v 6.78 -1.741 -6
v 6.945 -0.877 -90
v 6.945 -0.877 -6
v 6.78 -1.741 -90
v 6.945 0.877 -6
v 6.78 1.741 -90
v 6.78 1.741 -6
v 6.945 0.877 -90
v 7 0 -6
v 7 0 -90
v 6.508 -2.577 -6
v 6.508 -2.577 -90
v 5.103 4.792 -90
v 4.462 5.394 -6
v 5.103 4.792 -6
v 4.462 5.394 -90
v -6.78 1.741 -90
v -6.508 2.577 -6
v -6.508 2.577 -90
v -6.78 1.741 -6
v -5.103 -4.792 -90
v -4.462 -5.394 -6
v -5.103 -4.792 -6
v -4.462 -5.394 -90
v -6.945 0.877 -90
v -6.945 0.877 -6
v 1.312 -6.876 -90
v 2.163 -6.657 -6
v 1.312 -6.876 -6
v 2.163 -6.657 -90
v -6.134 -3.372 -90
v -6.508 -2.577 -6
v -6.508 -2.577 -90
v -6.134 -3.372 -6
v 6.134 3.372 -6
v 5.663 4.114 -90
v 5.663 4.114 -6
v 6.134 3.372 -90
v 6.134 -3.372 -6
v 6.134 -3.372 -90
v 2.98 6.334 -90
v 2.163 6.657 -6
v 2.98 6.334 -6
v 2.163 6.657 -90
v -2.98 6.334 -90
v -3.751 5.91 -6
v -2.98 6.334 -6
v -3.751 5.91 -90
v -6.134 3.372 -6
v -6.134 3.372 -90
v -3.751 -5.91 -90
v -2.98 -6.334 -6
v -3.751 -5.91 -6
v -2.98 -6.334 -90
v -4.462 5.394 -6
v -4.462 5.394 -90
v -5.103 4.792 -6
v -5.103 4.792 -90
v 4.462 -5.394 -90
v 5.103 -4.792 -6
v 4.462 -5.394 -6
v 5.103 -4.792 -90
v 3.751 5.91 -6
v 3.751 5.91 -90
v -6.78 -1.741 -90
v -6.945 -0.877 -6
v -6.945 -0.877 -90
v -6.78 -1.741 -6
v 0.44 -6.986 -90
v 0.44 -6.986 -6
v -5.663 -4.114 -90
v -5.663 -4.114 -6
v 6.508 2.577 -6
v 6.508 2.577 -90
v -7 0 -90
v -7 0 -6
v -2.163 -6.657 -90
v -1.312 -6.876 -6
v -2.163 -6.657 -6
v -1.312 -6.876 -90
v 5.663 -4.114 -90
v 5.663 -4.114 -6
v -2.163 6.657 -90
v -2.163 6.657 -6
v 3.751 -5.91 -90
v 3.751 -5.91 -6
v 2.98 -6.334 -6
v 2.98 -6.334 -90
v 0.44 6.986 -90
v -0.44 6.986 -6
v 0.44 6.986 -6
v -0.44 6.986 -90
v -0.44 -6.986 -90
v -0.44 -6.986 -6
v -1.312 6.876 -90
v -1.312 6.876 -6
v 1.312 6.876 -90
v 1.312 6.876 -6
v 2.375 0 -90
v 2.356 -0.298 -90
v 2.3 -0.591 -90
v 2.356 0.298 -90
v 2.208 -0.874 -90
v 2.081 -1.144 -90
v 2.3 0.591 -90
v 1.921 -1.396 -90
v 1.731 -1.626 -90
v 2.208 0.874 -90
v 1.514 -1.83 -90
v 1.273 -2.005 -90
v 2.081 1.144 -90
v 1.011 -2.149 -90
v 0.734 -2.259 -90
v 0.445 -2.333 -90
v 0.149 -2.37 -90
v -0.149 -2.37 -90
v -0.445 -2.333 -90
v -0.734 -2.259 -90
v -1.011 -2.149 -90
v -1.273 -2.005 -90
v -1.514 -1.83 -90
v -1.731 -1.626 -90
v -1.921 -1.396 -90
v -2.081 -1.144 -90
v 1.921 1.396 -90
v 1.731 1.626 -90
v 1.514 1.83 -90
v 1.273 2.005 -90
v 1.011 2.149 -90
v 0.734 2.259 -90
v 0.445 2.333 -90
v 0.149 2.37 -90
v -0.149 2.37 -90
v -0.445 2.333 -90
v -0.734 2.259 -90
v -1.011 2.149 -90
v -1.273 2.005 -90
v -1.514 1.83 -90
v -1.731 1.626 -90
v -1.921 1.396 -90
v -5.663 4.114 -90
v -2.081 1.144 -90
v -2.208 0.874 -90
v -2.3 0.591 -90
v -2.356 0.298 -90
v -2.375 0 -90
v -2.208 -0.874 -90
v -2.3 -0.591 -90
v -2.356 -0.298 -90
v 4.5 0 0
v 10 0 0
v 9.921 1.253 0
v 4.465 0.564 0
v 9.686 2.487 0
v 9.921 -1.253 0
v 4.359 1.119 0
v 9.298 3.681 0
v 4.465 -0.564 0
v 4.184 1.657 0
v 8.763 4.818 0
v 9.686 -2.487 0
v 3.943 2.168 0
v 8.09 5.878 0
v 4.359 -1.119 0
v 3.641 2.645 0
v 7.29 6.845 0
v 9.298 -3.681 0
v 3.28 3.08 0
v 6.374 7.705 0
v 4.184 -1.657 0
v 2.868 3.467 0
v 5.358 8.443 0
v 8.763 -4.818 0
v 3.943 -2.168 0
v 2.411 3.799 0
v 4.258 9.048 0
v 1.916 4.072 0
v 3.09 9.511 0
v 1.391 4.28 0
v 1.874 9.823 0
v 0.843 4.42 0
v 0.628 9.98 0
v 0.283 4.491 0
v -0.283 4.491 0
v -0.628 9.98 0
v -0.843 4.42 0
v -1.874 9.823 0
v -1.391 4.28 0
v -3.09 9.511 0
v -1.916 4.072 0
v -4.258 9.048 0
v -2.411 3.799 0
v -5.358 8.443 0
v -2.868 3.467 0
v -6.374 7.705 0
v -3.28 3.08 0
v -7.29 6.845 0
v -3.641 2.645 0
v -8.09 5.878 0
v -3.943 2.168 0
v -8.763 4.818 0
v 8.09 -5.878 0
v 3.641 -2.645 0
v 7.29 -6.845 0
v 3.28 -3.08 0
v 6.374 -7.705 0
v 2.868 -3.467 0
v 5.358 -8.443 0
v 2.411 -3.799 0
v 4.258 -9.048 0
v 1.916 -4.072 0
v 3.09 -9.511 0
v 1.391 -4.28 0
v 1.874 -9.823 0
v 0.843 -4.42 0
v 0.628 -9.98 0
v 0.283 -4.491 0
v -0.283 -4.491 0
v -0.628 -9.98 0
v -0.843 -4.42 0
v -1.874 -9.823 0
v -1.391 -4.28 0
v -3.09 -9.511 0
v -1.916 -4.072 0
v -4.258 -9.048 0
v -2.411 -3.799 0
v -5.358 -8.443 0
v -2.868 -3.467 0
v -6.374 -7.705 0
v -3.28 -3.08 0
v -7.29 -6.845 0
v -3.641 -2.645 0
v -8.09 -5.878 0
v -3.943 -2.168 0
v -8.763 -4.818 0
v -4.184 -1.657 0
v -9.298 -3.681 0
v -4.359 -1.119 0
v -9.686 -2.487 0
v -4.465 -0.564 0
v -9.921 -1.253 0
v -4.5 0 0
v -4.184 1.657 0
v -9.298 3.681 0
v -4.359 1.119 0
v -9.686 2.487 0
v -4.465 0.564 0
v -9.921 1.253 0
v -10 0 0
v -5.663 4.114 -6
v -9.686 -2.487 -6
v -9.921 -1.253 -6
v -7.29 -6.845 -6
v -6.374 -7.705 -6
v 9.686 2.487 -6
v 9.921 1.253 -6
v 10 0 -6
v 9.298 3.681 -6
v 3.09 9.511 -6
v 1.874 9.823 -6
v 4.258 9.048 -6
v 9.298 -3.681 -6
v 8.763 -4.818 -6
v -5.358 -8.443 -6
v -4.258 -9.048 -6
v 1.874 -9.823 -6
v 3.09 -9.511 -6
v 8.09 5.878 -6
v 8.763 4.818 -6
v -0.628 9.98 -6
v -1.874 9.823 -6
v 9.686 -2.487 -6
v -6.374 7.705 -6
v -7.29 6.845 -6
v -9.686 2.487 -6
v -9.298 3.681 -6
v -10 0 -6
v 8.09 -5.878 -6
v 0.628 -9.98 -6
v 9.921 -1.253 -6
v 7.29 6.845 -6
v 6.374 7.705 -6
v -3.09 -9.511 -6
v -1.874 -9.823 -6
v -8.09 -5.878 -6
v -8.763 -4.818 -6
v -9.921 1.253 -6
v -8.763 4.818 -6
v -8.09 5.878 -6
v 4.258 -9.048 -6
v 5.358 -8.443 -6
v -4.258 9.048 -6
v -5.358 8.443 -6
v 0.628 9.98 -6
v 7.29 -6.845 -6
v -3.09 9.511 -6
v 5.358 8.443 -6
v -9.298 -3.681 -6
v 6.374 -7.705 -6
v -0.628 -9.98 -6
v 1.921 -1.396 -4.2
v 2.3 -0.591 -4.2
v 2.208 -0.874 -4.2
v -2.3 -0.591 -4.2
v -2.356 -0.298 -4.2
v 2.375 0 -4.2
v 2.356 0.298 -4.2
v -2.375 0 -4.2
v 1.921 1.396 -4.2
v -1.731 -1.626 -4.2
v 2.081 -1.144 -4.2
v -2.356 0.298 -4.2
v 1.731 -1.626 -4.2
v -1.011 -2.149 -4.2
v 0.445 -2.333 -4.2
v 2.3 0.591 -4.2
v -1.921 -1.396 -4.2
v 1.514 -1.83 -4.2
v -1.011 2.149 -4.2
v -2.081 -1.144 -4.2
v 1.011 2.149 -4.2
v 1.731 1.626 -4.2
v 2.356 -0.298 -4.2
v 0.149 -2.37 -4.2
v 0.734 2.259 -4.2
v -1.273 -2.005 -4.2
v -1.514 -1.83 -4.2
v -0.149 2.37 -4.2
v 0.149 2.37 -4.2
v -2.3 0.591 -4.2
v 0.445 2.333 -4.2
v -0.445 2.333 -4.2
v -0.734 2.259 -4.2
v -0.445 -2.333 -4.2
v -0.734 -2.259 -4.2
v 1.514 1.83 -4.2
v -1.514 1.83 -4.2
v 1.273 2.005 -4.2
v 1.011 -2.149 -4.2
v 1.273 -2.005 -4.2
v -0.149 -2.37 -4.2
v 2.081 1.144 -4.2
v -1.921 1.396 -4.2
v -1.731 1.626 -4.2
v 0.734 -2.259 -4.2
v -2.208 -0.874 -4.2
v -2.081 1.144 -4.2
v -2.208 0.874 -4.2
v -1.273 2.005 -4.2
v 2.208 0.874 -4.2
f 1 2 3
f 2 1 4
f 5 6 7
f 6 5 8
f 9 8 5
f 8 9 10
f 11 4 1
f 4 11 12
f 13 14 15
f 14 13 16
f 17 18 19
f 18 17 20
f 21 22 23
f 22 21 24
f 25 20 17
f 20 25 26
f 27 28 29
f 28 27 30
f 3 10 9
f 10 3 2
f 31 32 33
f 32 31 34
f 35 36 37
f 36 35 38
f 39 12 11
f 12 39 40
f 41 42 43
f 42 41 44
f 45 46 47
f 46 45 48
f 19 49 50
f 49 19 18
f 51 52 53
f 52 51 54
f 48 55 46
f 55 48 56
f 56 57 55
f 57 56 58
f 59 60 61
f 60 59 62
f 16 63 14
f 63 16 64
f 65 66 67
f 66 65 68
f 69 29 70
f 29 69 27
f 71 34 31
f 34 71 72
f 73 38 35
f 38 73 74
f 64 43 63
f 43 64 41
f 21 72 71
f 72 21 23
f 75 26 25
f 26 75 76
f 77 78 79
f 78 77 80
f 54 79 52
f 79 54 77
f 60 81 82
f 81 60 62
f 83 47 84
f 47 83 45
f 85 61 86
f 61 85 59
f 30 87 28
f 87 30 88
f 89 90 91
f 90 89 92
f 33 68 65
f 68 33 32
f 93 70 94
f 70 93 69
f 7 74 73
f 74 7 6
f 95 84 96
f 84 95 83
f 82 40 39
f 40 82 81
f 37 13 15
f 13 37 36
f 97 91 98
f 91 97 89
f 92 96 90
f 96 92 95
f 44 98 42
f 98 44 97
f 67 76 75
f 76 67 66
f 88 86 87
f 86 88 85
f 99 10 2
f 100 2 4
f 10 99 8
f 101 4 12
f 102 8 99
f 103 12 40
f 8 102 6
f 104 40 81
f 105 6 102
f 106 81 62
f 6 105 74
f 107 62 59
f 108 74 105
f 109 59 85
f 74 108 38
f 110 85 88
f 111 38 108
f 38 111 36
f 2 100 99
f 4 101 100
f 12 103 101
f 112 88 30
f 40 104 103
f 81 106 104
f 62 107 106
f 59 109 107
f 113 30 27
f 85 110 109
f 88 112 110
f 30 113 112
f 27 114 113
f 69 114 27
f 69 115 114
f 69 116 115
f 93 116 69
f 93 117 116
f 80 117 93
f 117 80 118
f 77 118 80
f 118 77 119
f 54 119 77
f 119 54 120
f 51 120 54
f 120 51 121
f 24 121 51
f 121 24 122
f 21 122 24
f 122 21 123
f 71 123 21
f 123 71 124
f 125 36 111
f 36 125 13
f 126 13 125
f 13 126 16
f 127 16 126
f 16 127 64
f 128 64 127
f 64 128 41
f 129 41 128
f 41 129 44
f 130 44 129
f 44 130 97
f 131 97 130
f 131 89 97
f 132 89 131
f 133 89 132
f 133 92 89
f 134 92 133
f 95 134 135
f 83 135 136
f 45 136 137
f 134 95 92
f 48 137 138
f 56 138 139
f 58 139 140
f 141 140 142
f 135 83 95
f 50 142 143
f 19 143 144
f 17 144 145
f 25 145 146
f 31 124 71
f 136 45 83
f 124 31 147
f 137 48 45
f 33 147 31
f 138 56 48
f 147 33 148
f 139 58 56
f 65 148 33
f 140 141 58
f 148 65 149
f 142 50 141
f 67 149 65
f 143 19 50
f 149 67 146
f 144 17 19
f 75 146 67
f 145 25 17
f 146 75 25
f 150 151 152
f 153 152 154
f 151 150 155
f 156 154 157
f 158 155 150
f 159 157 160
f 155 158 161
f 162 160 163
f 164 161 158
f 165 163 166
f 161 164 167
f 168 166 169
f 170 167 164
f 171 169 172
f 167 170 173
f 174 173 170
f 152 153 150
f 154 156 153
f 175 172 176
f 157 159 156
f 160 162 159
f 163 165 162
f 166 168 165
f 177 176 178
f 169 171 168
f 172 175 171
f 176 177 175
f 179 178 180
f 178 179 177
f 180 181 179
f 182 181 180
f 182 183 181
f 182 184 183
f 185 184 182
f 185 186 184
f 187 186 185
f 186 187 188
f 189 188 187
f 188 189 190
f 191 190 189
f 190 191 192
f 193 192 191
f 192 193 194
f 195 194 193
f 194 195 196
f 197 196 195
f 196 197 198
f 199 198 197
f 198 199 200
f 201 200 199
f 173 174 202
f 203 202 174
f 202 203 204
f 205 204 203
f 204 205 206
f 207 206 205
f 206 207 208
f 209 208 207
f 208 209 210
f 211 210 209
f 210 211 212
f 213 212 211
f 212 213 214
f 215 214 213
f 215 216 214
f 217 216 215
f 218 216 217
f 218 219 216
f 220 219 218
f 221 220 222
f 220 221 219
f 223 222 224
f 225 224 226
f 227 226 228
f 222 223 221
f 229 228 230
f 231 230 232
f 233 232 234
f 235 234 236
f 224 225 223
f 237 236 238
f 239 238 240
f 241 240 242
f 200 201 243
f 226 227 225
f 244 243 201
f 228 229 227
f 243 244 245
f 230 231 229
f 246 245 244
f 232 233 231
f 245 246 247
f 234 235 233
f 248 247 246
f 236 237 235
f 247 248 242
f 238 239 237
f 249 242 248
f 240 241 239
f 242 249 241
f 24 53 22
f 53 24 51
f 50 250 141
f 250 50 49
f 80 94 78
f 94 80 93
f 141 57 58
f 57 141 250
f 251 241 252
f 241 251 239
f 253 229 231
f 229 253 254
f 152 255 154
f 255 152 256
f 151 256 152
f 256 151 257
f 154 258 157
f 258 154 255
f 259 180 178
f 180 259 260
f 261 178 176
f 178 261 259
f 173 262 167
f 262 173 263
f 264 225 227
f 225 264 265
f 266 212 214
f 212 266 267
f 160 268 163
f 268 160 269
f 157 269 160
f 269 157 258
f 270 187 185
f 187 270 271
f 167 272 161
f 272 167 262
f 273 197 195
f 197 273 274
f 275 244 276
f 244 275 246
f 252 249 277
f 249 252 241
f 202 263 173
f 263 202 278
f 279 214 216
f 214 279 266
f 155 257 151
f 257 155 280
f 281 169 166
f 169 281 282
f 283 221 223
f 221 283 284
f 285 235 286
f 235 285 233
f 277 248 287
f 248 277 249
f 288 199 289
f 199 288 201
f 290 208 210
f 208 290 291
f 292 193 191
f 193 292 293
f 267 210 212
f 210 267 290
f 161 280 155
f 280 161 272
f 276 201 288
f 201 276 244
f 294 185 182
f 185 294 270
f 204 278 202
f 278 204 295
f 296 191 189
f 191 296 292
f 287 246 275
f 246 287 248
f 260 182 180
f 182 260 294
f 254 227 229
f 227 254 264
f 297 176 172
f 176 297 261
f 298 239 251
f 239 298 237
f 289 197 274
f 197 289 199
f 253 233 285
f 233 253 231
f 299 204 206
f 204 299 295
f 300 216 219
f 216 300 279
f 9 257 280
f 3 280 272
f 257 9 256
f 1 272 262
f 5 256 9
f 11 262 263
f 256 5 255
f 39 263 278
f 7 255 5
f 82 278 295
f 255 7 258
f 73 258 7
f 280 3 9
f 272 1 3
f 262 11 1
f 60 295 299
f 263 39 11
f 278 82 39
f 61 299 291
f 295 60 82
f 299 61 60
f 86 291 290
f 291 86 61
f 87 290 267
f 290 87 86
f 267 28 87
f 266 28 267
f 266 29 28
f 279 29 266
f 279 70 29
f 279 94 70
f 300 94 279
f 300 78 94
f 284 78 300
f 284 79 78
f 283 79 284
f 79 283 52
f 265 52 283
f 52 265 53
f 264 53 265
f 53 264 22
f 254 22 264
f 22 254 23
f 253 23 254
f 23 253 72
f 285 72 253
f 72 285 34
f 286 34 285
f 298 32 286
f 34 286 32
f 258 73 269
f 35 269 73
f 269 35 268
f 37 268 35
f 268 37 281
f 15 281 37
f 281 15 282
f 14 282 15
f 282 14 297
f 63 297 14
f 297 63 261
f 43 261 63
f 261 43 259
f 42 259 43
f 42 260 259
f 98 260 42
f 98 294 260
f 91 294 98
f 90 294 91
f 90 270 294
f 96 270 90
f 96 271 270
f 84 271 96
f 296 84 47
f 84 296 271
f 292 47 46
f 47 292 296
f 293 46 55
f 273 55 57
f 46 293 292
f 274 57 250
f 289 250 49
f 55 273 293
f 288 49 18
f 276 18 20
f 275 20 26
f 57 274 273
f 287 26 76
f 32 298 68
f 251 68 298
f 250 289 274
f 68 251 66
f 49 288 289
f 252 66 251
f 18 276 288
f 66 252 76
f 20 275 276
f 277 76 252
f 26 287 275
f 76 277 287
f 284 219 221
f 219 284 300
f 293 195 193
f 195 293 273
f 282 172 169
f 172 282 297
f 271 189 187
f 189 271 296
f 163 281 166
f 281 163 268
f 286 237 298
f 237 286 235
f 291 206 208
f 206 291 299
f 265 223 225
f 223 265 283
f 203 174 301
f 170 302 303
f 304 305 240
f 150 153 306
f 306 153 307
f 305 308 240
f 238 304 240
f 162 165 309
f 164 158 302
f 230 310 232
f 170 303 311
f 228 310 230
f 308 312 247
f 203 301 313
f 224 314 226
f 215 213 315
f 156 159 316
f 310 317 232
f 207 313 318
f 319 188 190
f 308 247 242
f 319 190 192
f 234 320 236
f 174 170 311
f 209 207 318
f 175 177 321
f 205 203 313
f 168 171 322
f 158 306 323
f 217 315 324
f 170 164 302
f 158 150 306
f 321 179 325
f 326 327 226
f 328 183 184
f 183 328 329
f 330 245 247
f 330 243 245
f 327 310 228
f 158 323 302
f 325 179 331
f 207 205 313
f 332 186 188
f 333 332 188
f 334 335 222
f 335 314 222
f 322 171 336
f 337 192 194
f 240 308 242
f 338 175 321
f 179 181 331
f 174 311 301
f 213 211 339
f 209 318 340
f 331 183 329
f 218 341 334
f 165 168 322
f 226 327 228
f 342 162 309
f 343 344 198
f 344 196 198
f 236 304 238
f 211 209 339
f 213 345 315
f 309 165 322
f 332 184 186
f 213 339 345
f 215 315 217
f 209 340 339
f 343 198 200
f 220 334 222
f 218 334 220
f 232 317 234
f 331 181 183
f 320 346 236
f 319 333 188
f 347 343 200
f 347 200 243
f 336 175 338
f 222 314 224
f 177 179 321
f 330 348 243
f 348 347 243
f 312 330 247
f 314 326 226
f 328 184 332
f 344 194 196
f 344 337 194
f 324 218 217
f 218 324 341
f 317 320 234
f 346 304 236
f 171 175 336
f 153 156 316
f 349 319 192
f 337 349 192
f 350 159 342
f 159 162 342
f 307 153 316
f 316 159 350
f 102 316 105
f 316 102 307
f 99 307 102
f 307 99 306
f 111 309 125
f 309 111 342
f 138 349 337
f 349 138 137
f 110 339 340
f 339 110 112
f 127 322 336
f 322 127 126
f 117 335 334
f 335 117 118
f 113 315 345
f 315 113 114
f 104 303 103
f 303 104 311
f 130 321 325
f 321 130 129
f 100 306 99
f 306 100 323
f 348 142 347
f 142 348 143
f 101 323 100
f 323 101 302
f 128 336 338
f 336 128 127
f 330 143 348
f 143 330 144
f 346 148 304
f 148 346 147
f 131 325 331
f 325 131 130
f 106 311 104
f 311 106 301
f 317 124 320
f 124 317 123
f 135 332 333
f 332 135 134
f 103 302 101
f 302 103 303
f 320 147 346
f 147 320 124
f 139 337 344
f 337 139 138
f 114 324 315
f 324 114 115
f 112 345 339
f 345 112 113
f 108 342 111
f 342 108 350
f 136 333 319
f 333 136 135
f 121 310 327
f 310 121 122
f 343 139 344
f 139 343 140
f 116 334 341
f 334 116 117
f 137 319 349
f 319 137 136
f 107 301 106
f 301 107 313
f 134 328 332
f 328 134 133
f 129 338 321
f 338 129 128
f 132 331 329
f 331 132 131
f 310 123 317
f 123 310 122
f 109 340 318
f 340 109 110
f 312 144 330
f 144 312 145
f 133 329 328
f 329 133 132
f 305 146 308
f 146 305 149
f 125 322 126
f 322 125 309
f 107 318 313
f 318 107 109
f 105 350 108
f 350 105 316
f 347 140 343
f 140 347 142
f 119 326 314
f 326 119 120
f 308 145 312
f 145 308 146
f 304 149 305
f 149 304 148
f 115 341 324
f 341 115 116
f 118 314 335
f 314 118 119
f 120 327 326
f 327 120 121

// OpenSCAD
$fn = 50;


difference() {
	union() {
		translate(v = [0, 0, -90.0000000000]) {
			cylinder(h = 90, r = 7.0000000000);
		}
		translate(v = [0, 0, -6.0000000000]) {
			cylinder(h = 6, r = 10.0000000000);
		}
	}
	union() {
		translate(v = [0, 0, 0]) {
			rotate(a = [0, 0, 0]) {
				difference() {
					union() {
						#translate(v = [0, 0, -90.0000000000]) {
							cylinder(h = 90, r = 2.2500000000);
						}
						#translate(v = [0, 0, -4.2000000000]) {
							cylinder(h = 4.2000000000, r = 7.0000000000, r1 = 2.3750000000, r2 = 4.5000000000);
						}
						#translate(v = [0, 0, -90.0000000000]) {
							cylinder(h = 90, r = 2.3750000000);
						}
						#translate(v = [0, 0, -90.0000000000]) {
							cylinder(h = 90, r = 2.2500000000);
						}
					}
					union();
				}
			}
		}
	}
}
